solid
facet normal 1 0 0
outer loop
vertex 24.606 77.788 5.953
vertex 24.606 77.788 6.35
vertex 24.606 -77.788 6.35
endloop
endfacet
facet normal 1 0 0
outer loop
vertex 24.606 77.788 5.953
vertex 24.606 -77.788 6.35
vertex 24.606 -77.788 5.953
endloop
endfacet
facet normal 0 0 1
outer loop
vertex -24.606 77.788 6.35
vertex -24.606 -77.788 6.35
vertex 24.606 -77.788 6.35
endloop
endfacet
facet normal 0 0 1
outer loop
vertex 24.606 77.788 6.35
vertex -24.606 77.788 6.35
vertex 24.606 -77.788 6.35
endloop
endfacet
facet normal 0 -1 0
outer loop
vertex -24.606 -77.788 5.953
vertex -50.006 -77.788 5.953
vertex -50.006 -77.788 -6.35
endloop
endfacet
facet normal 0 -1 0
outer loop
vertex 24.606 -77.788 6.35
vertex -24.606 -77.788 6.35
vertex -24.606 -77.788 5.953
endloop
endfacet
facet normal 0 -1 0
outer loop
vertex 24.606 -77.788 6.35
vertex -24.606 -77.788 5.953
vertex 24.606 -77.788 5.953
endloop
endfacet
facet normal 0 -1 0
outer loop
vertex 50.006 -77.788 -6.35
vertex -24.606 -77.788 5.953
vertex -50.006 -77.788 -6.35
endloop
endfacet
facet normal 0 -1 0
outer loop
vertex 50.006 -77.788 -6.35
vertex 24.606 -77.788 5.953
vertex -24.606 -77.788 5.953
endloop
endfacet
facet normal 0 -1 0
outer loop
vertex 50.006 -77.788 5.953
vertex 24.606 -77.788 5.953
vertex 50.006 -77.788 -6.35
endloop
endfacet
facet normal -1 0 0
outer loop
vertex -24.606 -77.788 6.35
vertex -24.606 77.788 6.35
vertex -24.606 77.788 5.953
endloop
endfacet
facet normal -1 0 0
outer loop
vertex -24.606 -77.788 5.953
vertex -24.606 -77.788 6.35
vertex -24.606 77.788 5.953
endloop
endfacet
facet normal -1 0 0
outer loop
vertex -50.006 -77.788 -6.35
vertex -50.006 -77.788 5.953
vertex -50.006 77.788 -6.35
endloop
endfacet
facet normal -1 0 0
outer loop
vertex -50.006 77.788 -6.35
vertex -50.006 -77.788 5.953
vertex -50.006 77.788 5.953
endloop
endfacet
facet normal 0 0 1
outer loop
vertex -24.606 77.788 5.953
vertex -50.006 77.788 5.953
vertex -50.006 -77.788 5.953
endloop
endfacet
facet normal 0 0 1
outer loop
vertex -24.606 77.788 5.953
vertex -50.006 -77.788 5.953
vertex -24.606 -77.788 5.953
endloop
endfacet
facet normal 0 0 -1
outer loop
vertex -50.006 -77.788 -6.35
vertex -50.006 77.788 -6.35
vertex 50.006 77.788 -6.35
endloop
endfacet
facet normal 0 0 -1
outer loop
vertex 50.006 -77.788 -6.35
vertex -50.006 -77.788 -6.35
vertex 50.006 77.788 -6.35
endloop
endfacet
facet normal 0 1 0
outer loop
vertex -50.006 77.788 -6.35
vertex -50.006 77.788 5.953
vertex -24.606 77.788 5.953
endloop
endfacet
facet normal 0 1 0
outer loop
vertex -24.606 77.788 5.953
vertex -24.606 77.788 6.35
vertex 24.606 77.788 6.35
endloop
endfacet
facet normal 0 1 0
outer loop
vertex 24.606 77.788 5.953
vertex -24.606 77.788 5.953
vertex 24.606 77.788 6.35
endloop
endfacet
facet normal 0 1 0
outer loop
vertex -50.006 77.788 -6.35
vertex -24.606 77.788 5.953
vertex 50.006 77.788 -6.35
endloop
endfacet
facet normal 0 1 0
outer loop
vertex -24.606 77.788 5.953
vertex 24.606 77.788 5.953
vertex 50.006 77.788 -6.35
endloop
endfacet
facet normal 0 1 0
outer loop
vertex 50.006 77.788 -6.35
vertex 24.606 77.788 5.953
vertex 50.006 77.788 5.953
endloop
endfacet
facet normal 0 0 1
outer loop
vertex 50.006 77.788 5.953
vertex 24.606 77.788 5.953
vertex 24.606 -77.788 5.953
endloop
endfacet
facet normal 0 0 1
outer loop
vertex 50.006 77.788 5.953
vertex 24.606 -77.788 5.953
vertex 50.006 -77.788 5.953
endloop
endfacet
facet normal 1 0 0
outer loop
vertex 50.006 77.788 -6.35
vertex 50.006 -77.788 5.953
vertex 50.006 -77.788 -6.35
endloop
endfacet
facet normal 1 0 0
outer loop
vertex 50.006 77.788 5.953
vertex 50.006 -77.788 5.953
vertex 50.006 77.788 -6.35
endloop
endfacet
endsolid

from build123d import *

# Parameters (mm, degrees)
SKETCH1_W           = 100.0125
SKETCH1_H           = 155.575
BOSS_EXTRUDE1_DEPTH = 6.35
CUT_EXTRUDE1_REACH  = 157.575
SKETCH4_W           = 25.4
SKETCH4_H           = 0.396875


with BuildPart() as part:
    # Sketch1 → Boss-Extrude1 (new body, symmetric)
    with BuildSketch(Plane.XY):
        Rectangle(SKETCH1_W, SKETCH1_H)
    extrude(amount=BOSS_EXTRUDE1_DEPTH, both=True)

    # Sketch4 → Cut-Extrude1 (cut, up to next)
    with BuildSketch(Plane(origin=(0, 77.7875, 0), x_dir=(1, 0, 0), z_dir=(0, 1, 0)), mode=Mode.PRIVATE) as cut_extrude1_sk1:
        with Locations((-37.30625, -6.1515625)):
            Rectangle(SKETCH4_W, SKETCH4_H)
    cut_extrude1_tool1 = extrude(cut_extrude1_sk1.sketch, amount=-CUT_EXTRUDE1_REACH, mode=Mode.PRIVATE) & part.part
    add(cut_extrude1_tool1.solids().sort_by_distance((-37.30625, 77.7875, 6.151562))[0], mode=Mode.SUBTRACT)
    # Sketch4 → Cut-Extrude1 (cut, up to next)
    with BuildSketch(Plane(origin=(0, 77.7875, 0), x_dir=(1, 0, 0), z_dir=(0, 1, 0)), mode=Mode.PRIVATE) as cut_extrude1_sk2:
        with Locations((37.30625, -6.1515625)):
            Rectangle(SKETCH4_W, SKETCH4_H)
    cut_extrude1_tool2 = extrude(cut_extrude1_sk2.sketch, amount=-CUT_EXTRUDE1_REACH, mode=Mode.PRIVATE) & part.part
    add(cut_extrude1_tool2.solids().sort_by_distance((37.30625, 77.7875, 6.151563))[0], mode=Mode.SUBTRACT)


solid = part.part
